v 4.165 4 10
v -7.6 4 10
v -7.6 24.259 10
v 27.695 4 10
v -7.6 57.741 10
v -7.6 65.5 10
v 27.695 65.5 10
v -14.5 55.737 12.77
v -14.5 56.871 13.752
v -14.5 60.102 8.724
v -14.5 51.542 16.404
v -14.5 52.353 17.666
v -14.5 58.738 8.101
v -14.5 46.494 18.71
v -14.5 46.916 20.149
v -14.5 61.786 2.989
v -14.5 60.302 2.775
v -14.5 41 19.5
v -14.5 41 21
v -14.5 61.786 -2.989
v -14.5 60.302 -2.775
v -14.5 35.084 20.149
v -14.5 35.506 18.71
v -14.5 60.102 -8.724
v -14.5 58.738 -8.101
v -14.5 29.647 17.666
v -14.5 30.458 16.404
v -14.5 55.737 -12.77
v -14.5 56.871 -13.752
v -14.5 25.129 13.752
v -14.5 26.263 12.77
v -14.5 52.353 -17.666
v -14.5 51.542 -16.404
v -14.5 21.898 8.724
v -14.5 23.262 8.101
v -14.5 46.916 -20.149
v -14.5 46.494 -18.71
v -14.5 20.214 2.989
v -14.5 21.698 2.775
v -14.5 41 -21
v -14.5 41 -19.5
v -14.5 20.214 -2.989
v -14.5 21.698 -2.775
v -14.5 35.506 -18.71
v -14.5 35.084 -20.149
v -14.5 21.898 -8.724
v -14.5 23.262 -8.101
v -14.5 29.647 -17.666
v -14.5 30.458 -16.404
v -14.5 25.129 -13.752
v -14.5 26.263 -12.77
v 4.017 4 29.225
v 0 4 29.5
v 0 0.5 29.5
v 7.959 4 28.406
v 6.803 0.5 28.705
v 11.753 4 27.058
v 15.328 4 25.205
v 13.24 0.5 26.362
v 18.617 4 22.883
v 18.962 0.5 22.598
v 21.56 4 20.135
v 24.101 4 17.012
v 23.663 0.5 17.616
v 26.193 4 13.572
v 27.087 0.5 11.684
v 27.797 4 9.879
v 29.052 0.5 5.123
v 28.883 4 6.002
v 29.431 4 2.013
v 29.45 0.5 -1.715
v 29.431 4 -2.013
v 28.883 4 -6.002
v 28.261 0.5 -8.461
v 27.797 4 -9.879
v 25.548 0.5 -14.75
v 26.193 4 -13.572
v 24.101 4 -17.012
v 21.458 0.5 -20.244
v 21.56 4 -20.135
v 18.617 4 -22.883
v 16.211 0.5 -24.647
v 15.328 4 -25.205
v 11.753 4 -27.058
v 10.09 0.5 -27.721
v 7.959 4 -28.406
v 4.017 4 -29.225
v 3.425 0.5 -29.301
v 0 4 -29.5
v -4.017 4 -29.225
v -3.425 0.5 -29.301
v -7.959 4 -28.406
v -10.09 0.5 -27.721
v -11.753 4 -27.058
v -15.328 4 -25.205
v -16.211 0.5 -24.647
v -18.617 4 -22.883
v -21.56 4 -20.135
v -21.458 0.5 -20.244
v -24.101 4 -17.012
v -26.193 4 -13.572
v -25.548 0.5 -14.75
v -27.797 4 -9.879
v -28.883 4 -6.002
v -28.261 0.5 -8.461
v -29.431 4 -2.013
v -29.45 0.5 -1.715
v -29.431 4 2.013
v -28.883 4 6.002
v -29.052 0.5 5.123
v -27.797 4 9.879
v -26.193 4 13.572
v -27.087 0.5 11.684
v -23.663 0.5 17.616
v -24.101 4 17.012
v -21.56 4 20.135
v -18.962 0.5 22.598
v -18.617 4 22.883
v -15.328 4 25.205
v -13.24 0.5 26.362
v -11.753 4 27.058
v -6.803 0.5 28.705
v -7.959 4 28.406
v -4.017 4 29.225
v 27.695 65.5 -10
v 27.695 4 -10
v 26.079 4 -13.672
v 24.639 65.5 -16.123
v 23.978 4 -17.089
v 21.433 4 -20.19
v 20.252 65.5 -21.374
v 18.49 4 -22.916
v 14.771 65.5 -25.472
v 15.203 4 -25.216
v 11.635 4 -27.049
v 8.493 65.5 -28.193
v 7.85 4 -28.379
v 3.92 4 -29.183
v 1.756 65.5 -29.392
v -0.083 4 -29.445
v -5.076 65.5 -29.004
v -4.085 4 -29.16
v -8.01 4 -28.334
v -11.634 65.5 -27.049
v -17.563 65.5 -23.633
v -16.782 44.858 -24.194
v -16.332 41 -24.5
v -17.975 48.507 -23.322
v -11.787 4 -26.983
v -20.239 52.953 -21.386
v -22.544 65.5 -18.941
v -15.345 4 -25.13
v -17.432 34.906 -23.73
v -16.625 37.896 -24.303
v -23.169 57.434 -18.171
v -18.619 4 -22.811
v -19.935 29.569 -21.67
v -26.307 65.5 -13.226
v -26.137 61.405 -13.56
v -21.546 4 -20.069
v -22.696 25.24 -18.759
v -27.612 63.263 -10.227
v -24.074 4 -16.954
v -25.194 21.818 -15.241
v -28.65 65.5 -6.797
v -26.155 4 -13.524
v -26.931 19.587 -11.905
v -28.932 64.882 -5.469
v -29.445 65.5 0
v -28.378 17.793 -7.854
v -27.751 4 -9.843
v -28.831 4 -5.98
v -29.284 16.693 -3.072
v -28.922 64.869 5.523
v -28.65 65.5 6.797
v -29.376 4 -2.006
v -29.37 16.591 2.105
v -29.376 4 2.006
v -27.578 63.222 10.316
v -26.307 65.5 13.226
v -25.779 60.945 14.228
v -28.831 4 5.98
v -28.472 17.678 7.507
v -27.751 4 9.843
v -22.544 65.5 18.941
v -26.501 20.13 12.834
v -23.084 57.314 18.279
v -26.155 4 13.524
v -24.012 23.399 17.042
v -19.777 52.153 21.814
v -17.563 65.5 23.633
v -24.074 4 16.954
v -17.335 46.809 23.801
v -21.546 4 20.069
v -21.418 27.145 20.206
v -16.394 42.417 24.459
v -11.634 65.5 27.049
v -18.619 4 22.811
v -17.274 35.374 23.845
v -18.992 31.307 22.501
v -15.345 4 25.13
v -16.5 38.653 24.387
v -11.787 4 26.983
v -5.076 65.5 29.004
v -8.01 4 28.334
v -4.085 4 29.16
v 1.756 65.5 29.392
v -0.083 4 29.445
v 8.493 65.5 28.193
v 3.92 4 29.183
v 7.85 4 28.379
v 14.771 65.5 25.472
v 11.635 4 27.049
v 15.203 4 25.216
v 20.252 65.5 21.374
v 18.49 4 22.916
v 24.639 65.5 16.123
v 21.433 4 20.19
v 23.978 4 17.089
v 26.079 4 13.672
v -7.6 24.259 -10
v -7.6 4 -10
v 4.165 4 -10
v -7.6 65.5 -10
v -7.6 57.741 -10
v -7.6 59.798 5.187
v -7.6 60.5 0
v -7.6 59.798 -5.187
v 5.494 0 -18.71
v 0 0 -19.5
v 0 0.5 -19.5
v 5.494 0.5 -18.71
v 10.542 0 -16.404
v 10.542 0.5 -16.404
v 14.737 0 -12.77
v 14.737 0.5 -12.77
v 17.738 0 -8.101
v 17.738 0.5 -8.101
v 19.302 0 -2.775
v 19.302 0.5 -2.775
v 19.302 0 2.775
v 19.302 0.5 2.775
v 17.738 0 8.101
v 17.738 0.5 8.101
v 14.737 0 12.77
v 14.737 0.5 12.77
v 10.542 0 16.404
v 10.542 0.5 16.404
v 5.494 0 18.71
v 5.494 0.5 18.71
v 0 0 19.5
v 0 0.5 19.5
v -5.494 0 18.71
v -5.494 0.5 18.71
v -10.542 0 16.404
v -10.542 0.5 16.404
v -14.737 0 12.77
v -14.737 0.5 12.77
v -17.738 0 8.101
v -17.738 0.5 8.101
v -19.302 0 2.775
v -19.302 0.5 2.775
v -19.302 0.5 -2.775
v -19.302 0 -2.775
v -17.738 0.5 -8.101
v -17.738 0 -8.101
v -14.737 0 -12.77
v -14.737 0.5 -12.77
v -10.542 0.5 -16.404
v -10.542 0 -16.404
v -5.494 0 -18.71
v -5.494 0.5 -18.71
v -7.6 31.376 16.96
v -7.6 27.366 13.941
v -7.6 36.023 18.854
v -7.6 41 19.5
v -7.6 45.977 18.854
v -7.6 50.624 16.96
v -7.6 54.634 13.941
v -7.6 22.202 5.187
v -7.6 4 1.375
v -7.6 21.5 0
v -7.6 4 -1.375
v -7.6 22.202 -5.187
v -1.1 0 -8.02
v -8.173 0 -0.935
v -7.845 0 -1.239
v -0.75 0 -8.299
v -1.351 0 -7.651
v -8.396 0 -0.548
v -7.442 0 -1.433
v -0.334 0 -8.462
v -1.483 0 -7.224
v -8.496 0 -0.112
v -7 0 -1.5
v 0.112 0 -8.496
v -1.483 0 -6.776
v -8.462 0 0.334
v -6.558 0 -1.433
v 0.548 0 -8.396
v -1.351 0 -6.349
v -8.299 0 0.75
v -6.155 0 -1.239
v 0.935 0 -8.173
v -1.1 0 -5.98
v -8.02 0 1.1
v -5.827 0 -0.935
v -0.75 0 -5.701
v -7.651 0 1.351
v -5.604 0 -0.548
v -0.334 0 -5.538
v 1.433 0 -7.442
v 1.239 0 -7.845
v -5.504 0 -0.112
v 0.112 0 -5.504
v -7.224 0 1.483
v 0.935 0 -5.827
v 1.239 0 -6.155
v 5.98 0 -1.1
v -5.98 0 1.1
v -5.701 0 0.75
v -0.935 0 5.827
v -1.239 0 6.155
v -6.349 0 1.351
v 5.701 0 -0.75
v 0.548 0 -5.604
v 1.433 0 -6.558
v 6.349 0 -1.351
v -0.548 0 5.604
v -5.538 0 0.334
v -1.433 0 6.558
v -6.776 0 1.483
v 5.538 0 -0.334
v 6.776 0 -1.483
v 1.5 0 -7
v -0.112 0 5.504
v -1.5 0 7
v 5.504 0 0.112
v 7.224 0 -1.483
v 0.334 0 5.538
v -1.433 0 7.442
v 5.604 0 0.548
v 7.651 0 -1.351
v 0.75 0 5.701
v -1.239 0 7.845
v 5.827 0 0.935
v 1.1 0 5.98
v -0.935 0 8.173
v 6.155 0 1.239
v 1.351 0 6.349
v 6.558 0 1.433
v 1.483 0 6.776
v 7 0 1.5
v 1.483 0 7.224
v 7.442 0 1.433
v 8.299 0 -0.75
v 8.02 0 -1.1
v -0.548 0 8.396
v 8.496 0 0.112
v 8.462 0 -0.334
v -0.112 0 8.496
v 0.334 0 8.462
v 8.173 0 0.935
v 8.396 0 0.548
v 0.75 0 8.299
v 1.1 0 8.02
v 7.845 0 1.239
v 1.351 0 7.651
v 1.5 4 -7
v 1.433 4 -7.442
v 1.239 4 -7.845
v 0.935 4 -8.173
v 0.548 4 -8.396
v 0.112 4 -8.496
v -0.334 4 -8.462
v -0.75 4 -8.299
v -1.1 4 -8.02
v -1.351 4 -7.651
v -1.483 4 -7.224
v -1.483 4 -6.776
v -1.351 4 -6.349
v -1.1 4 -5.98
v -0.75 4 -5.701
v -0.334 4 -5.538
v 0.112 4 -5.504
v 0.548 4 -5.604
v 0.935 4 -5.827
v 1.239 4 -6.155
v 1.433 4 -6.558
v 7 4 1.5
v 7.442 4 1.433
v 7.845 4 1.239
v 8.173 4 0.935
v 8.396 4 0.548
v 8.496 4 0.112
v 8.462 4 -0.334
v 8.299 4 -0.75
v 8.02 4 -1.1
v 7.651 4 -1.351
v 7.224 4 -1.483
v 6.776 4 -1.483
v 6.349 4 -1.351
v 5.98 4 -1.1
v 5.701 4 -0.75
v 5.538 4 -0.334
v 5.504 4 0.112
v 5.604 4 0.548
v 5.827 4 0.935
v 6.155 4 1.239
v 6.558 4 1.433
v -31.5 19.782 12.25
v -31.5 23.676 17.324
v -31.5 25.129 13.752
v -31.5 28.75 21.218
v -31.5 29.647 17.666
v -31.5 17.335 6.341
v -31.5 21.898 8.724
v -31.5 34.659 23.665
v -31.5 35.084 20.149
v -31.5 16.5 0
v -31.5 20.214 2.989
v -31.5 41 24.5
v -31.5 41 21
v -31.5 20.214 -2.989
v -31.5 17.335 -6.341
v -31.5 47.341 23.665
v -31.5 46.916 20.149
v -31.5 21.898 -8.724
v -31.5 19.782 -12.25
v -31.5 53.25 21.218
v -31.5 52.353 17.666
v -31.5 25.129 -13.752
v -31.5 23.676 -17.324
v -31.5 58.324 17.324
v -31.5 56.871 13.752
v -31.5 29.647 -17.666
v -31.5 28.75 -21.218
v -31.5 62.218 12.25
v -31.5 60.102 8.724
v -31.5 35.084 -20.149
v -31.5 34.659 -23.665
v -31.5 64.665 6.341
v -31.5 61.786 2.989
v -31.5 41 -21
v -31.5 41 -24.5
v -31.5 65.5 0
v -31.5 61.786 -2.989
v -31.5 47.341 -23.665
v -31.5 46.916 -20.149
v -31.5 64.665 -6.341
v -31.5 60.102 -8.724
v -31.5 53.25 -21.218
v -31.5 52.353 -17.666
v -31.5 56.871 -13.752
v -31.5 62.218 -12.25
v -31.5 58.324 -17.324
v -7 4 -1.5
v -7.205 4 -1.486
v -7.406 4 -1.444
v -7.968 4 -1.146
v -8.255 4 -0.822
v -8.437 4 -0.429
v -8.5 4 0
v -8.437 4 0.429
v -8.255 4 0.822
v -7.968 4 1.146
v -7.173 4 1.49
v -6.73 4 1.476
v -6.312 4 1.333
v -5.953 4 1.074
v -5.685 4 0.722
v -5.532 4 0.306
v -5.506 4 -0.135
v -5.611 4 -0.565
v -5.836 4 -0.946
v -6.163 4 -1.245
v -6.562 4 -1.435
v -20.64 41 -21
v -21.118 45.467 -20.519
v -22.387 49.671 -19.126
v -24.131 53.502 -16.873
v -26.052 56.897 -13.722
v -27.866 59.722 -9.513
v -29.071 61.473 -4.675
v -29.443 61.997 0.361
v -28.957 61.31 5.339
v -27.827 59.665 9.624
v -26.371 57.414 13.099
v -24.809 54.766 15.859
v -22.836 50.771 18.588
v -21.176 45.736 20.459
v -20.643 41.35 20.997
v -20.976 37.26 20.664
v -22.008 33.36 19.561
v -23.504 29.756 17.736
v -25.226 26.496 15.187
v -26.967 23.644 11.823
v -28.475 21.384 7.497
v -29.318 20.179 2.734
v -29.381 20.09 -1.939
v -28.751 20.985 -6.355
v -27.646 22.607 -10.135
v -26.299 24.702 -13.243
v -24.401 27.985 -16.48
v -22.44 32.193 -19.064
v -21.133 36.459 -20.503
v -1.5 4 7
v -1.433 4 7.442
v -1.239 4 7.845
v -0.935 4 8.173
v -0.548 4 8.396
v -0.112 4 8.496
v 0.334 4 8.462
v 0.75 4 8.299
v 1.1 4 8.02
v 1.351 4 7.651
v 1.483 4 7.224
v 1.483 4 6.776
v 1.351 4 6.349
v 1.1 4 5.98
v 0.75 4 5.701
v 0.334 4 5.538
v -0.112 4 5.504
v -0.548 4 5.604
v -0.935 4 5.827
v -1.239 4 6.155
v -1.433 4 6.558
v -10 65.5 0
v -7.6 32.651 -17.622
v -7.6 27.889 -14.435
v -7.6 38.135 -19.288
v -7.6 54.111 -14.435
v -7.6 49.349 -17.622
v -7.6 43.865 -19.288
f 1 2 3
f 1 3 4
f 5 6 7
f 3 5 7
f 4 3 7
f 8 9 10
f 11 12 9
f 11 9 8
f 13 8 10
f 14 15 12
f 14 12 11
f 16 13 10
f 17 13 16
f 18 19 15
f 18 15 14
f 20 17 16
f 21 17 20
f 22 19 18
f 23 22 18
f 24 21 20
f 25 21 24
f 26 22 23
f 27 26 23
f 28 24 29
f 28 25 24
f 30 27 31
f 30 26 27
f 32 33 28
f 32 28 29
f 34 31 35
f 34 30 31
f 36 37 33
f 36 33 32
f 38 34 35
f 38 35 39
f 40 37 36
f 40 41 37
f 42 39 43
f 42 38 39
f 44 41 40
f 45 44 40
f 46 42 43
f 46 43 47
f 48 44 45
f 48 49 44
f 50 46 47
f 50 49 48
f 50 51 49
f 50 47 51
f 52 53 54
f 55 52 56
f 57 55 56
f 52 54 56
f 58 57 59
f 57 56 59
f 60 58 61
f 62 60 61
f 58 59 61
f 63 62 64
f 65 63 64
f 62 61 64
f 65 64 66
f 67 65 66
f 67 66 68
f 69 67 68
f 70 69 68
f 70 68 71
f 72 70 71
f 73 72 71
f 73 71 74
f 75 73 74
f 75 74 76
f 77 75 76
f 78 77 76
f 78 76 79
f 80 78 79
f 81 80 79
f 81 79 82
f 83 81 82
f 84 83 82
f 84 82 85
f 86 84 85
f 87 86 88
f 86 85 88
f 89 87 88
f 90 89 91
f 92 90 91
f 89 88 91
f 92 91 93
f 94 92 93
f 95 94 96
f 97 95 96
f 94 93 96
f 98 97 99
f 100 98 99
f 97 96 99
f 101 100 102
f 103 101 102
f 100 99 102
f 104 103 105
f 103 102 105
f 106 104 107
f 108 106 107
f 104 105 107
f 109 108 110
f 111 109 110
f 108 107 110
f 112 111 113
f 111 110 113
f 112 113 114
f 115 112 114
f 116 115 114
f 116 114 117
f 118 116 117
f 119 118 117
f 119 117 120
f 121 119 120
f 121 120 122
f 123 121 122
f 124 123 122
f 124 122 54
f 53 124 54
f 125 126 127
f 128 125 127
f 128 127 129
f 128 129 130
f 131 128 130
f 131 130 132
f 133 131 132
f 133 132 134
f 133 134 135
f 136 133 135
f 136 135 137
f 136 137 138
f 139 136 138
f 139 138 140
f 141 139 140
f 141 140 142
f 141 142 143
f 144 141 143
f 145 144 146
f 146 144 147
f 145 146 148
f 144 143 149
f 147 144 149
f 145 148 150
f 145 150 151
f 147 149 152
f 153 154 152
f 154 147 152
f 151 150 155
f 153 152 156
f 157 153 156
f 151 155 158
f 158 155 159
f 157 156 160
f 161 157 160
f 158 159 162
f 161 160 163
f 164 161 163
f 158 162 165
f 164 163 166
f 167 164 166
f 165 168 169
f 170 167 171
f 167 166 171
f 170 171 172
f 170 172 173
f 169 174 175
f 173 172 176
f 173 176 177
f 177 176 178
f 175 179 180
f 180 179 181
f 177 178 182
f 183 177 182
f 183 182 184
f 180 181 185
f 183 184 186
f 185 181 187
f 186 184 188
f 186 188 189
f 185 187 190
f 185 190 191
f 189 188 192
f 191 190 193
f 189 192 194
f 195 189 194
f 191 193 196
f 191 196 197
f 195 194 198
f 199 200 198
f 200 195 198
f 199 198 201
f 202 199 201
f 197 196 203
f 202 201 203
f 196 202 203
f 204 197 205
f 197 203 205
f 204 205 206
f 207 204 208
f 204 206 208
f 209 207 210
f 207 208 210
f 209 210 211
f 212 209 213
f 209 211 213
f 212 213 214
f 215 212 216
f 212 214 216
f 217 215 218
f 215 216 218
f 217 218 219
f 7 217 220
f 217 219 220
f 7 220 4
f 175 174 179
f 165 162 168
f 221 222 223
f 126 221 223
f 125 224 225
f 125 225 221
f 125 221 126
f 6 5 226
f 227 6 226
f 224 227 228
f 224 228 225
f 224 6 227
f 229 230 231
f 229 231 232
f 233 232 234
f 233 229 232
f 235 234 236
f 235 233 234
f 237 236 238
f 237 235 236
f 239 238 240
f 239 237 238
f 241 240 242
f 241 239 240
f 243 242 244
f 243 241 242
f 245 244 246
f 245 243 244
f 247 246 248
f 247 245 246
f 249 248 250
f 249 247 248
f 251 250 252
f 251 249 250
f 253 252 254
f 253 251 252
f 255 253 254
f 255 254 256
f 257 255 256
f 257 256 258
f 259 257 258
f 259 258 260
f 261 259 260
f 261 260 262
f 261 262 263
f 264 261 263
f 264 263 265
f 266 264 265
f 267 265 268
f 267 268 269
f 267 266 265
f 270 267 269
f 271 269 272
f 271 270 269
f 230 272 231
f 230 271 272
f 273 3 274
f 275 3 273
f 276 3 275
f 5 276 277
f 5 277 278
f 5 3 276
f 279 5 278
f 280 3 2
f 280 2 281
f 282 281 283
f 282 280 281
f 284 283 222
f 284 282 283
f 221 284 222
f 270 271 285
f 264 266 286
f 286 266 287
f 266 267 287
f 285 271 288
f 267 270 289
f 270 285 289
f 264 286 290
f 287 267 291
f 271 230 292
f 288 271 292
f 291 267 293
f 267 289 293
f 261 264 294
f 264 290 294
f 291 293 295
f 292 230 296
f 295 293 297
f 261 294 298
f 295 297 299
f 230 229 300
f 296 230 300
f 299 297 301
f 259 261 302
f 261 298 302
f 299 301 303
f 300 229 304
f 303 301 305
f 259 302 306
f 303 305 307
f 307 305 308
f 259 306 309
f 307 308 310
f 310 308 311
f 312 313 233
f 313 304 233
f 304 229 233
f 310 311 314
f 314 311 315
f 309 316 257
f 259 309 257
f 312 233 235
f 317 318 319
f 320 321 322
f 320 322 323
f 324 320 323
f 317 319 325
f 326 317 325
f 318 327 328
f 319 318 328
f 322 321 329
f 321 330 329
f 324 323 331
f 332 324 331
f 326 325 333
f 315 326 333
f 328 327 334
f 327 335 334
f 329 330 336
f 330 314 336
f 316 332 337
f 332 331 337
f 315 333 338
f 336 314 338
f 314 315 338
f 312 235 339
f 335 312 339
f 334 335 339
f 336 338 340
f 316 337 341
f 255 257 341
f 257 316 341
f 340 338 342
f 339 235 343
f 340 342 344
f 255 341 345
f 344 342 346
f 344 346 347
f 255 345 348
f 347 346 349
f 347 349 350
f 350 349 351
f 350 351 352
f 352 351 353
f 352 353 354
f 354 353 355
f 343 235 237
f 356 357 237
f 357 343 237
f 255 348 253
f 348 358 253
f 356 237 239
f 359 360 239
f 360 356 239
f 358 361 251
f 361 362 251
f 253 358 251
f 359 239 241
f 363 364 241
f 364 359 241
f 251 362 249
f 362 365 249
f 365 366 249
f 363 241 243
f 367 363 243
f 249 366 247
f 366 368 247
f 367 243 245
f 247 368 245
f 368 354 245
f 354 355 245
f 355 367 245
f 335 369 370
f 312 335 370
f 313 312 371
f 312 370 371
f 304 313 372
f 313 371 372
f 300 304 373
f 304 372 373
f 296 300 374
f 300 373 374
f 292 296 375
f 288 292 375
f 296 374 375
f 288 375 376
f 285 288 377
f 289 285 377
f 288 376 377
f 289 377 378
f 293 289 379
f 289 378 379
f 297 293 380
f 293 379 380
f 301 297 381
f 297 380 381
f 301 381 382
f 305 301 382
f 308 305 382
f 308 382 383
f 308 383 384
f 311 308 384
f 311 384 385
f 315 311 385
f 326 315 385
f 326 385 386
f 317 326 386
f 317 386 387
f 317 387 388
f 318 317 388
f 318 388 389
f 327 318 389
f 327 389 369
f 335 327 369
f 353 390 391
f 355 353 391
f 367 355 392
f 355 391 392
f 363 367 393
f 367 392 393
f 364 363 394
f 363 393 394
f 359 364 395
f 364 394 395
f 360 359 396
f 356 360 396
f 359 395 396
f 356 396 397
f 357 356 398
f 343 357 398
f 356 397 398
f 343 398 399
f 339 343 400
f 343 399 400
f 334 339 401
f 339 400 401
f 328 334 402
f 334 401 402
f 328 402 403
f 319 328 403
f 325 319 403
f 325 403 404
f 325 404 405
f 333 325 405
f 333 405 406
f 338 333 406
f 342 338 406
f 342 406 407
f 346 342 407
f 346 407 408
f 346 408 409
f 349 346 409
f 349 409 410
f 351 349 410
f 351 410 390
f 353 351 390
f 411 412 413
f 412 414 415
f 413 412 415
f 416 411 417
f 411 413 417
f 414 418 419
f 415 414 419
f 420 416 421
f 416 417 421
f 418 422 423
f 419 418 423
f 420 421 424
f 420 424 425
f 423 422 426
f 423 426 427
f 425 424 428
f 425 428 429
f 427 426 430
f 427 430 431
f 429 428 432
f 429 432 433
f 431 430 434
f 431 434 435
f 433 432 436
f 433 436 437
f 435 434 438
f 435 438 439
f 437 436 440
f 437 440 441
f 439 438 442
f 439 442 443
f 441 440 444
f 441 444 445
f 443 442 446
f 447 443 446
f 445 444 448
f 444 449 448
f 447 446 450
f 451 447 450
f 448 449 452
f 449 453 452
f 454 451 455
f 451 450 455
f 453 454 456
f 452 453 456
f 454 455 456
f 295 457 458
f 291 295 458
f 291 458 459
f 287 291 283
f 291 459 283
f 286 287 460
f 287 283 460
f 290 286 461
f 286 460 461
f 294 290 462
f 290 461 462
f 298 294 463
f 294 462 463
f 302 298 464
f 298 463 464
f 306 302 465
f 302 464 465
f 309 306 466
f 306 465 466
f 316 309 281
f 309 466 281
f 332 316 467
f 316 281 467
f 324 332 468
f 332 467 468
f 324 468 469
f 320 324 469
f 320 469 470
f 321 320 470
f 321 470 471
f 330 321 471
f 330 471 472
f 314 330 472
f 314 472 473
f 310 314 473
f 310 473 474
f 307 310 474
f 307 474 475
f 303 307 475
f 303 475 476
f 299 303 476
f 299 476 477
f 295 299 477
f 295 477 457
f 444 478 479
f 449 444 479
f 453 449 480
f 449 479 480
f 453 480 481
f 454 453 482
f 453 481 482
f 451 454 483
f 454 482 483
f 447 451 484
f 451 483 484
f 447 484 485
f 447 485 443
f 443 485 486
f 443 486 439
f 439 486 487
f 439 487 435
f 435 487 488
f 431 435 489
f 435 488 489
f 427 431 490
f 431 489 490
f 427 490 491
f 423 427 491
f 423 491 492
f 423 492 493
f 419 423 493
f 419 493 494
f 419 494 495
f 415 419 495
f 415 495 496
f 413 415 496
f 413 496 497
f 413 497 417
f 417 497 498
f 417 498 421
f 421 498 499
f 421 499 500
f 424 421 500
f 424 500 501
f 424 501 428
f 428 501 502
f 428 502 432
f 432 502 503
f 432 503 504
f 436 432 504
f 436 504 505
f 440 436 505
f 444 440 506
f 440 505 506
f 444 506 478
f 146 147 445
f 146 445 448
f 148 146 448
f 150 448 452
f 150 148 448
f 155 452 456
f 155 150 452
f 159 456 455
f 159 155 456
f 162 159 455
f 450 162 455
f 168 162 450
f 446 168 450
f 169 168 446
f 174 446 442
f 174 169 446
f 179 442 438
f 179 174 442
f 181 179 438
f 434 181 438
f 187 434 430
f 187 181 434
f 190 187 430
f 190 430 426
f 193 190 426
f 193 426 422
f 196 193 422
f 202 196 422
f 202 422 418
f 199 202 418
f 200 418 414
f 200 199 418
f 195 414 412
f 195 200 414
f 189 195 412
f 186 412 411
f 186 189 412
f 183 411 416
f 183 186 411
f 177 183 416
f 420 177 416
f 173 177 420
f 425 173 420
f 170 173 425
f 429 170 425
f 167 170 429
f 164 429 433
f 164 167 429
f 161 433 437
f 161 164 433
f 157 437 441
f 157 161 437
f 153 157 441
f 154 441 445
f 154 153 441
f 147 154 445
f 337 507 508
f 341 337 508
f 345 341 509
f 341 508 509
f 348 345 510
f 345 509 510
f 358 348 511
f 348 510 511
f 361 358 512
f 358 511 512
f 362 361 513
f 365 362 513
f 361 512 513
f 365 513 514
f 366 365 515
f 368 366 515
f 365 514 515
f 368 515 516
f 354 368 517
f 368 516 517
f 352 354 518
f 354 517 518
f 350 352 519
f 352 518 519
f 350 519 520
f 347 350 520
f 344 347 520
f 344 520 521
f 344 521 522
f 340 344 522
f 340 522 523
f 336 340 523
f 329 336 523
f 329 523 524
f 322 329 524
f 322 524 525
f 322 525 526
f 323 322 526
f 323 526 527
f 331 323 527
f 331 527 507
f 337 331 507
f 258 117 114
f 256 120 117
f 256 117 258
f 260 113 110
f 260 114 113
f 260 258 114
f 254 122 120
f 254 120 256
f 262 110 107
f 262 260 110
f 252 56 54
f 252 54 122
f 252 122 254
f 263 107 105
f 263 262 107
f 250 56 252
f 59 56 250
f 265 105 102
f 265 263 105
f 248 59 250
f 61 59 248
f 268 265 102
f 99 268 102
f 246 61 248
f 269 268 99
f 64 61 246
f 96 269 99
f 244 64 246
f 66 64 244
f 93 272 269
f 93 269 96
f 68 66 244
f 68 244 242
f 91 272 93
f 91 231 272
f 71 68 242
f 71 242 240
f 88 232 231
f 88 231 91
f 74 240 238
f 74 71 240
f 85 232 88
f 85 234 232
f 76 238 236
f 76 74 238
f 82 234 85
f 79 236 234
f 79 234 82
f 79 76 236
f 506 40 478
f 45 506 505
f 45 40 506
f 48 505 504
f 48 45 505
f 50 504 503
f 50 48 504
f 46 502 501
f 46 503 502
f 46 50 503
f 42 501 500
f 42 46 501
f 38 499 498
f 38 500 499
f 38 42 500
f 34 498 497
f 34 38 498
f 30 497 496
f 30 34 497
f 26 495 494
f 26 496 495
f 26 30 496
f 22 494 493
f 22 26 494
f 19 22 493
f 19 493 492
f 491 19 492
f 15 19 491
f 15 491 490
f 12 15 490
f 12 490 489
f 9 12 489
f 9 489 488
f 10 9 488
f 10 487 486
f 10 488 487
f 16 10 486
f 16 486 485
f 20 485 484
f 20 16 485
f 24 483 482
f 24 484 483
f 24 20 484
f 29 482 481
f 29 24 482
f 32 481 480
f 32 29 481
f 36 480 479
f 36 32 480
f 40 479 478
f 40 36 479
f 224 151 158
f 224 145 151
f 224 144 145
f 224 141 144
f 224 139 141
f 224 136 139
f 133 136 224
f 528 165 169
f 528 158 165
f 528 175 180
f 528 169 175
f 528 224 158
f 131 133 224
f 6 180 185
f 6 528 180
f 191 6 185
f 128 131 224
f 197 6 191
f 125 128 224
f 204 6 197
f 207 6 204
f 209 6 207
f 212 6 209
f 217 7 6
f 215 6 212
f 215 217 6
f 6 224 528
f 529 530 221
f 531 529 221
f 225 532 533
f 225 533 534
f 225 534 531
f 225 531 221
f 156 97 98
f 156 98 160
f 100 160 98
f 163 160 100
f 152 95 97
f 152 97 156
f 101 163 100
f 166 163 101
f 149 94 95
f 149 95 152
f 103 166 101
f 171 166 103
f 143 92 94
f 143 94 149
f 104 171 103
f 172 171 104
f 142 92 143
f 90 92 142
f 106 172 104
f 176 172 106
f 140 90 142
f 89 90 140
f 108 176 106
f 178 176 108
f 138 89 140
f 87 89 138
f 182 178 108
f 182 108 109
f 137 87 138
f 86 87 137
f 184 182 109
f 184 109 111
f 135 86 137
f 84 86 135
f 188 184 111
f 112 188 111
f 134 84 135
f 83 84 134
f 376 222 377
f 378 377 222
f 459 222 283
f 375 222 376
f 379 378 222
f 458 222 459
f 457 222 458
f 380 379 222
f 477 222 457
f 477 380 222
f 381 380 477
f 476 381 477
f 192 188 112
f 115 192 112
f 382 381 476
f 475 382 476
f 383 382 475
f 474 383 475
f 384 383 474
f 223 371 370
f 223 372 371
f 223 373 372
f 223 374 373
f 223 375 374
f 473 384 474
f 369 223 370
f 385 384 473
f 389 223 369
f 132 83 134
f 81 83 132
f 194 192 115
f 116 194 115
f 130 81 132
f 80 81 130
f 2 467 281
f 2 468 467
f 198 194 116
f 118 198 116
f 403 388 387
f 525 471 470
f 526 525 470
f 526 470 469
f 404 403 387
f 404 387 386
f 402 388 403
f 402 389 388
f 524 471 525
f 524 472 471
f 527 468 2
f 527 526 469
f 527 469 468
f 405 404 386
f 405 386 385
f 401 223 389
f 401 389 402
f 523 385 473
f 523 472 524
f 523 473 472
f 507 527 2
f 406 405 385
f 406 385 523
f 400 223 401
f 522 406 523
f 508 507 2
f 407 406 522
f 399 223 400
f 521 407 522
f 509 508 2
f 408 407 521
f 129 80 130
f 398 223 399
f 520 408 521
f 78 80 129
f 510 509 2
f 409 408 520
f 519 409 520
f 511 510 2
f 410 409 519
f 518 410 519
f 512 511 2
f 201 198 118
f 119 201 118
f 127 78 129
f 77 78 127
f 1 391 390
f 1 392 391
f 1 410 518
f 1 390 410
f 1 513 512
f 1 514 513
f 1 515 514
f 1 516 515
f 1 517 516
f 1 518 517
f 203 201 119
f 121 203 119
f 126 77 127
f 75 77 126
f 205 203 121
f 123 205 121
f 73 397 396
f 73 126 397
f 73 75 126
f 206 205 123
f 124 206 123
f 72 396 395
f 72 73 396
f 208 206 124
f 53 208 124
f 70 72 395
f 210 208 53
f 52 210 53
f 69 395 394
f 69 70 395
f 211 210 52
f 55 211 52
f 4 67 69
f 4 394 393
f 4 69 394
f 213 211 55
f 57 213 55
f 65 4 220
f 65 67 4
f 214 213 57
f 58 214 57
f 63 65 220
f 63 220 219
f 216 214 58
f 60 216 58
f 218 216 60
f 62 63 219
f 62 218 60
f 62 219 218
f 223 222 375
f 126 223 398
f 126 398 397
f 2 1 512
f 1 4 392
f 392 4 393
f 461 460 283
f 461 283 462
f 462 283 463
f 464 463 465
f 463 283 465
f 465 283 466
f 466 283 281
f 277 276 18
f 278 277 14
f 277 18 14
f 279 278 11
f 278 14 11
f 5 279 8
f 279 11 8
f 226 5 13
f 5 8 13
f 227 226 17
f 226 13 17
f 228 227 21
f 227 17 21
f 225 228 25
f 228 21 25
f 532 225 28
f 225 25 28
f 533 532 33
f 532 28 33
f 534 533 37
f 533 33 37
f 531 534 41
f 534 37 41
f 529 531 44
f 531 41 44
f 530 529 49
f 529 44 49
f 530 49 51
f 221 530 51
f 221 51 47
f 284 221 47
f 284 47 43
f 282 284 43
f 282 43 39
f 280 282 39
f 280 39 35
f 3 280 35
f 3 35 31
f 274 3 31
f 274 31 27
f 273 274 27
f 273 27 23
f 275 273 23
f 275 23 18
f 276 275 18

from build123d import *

# Parameters (mm, degrees)
SKETCH_1_R               = 29.5
EXTRUDE_1_DEPTH          = 4
SKETCH_2_R               = 1.5
CUT_EXTRUDE_1_DEPTH      = 42.910619179
PATTERN_CIRCULAR_1_COUNT = 4
SKETCH_3_R               = 29.444869788
EXTRUDE_2_DEPTH          = 61.5
SKETCH_4_W               = 39.5
SKETCH_4_H               = 20
CUT_EXTRUDE_2_DEPTH      = 61.5
EXTRUDE_START            = -10
SKETCH_7_R               = 24.5
SKETCH_7_R_2             = 21
EXTRUDE_3_DEPTH          = 21.5
CUT_EXTRUDE_START        = -17
SKETCH_11_R              = 21
CUT_EXTRUDE_7_DEPTH      = 17
SKETCH_12_R              = 19.5
CUT_EXTRUDE_10_DEPTH     = 23.9
SKETCH_13_R              = 29.5
SKETCH_13_R_2            = 19.5
CUT_EXTRUDE_11_DEPTH     = 0.5


with BuildPart() as part:
    # Эскиз1 → Бобышка-Вытянуть1 (new body)
    with BuildSketch(Plane(origin=(0, 0, 0), x_dir=(1, 0, 0), z_dir=(0, 1, 0))):
        with Locations(Location((0, 0, 0), (0, 0, 270))):
            Circle(SKETCH_1_R)
    extrude(amount=EXTRUDE_1_DEPTH)

    # Эскиз2 → Вырез-Вытянуть1 (cut, through all)
    with BuildSketch(Plane(origin=(0, 4, 0), x_dir=(1, 0, 0), z_dir=(0, 1, 0))):
        with Locations(Location((7, 0, 0), (0, 0, 270))):
            Circle(SKETCH_2_R)
    cut_extrude_1 = extrude(amount=-CUT_EXTRUDE_1_DEPTH, mode=Mode.SUBTRACT)

    # Круговой массив1: Вырез-Вытянуть1 ×4 about axis
    pattern_circular_1_axis = Axis((0, 0, 0), (0, 1, 0))
    for i in range(1, PATTERN_CIRCULAR_1_COUNT):
        add(cut_extrude_1.rotate(pattern_circular_1_axis, i * 360 / PATTERN_CIRCULAR_1_COUNT), mode=Mode.SUBTRACT)

    # Эскиз3 → Бобышка-Вытянуть2 (add)
    with BuildSketch(Plane(origin=(0, 4, 0), x_dir=(1, 0, 0), z_dir=(0, 1, 0))):
        with Locations(Location((0, 0, 0), (0, 0, 270))):
            Circle(SKETCH_3_R)
    extrude(amount=EXTRUDE_2_DEPTH)

    # Эскиз4 → Вырез-Вытянуть2 (cut)
    with BuildSketch(Plane(origin=(0, 65.5, 0), x_dir=(1, 0, 0), z_dir=(0, 1, 0))):
        with Locations((12.15, 0)):
            Rectangle(SKETCH_4_W, SKETCH_4_H)
    extrude(amount=-CUT_EXTRUDE_2_DEPTH, mode=Mode.SUBTRACT)

    # Эскиз7 → Бобышка-Вытянуть3 (add)
    with BuildSketch(Plane(origin=(0, 0, 0), x_dir=(0, 0, -1), z_dir=(1, 0, 0)).offset(EXTRUDE_START)):
        with Locations((0, 41)):
            Circle(SKETCH_7_R)
        with Locations((0, 41)):
            Circle(SKETCH_7_R_2, mode=Mode.SUBTRACT)
    extrude(amount=-EXTRUDE_3_DEPTH)

    # Эскиз11 → Вырез-Вытянуть7 (cut)
    with BuildSketch(Plane.ZY.offset(31.5).offset(CUT_EXTRUDE_START)):
        with Locations(Location((0, 41, 0), (0, 0, 180))):
            Circle(SKETCH_11_R)
    extrude(amount=CUT_EXTRUDE_7_DEPTH, mode=Mode.SUBTRACT)

    # Эскиз12 → Вырез-Вытянуть10 (cut)
    with BuildSketch(Plane.ZY.offset(31.5)):
        with Locations((0, 41)):
            Circle(SKETCH_12_R)
    extrude(amount=-CUT_EXTRUDE_10_DEPTH, mode=Mode.SUBTRACT)

    # Эскиз13 → Вырез-Вытянуть11 (cut)
    with BuildSketch(Plane.XZ):
        with Locations(Location((0, 0, 0), (0, 0, 270))):
            Circle(SKETCH_13_R)
        with Locations(Location((0, 0, 0), (0, 0, 270))):
            Circle(SKETCH_13_R_2, mode=Mode.SUBTRACT)
    extrude(amount=-CUT_EXTRUDE_11_DEPTH, mode=Mode.SUBTRACT)


solid = part.part
